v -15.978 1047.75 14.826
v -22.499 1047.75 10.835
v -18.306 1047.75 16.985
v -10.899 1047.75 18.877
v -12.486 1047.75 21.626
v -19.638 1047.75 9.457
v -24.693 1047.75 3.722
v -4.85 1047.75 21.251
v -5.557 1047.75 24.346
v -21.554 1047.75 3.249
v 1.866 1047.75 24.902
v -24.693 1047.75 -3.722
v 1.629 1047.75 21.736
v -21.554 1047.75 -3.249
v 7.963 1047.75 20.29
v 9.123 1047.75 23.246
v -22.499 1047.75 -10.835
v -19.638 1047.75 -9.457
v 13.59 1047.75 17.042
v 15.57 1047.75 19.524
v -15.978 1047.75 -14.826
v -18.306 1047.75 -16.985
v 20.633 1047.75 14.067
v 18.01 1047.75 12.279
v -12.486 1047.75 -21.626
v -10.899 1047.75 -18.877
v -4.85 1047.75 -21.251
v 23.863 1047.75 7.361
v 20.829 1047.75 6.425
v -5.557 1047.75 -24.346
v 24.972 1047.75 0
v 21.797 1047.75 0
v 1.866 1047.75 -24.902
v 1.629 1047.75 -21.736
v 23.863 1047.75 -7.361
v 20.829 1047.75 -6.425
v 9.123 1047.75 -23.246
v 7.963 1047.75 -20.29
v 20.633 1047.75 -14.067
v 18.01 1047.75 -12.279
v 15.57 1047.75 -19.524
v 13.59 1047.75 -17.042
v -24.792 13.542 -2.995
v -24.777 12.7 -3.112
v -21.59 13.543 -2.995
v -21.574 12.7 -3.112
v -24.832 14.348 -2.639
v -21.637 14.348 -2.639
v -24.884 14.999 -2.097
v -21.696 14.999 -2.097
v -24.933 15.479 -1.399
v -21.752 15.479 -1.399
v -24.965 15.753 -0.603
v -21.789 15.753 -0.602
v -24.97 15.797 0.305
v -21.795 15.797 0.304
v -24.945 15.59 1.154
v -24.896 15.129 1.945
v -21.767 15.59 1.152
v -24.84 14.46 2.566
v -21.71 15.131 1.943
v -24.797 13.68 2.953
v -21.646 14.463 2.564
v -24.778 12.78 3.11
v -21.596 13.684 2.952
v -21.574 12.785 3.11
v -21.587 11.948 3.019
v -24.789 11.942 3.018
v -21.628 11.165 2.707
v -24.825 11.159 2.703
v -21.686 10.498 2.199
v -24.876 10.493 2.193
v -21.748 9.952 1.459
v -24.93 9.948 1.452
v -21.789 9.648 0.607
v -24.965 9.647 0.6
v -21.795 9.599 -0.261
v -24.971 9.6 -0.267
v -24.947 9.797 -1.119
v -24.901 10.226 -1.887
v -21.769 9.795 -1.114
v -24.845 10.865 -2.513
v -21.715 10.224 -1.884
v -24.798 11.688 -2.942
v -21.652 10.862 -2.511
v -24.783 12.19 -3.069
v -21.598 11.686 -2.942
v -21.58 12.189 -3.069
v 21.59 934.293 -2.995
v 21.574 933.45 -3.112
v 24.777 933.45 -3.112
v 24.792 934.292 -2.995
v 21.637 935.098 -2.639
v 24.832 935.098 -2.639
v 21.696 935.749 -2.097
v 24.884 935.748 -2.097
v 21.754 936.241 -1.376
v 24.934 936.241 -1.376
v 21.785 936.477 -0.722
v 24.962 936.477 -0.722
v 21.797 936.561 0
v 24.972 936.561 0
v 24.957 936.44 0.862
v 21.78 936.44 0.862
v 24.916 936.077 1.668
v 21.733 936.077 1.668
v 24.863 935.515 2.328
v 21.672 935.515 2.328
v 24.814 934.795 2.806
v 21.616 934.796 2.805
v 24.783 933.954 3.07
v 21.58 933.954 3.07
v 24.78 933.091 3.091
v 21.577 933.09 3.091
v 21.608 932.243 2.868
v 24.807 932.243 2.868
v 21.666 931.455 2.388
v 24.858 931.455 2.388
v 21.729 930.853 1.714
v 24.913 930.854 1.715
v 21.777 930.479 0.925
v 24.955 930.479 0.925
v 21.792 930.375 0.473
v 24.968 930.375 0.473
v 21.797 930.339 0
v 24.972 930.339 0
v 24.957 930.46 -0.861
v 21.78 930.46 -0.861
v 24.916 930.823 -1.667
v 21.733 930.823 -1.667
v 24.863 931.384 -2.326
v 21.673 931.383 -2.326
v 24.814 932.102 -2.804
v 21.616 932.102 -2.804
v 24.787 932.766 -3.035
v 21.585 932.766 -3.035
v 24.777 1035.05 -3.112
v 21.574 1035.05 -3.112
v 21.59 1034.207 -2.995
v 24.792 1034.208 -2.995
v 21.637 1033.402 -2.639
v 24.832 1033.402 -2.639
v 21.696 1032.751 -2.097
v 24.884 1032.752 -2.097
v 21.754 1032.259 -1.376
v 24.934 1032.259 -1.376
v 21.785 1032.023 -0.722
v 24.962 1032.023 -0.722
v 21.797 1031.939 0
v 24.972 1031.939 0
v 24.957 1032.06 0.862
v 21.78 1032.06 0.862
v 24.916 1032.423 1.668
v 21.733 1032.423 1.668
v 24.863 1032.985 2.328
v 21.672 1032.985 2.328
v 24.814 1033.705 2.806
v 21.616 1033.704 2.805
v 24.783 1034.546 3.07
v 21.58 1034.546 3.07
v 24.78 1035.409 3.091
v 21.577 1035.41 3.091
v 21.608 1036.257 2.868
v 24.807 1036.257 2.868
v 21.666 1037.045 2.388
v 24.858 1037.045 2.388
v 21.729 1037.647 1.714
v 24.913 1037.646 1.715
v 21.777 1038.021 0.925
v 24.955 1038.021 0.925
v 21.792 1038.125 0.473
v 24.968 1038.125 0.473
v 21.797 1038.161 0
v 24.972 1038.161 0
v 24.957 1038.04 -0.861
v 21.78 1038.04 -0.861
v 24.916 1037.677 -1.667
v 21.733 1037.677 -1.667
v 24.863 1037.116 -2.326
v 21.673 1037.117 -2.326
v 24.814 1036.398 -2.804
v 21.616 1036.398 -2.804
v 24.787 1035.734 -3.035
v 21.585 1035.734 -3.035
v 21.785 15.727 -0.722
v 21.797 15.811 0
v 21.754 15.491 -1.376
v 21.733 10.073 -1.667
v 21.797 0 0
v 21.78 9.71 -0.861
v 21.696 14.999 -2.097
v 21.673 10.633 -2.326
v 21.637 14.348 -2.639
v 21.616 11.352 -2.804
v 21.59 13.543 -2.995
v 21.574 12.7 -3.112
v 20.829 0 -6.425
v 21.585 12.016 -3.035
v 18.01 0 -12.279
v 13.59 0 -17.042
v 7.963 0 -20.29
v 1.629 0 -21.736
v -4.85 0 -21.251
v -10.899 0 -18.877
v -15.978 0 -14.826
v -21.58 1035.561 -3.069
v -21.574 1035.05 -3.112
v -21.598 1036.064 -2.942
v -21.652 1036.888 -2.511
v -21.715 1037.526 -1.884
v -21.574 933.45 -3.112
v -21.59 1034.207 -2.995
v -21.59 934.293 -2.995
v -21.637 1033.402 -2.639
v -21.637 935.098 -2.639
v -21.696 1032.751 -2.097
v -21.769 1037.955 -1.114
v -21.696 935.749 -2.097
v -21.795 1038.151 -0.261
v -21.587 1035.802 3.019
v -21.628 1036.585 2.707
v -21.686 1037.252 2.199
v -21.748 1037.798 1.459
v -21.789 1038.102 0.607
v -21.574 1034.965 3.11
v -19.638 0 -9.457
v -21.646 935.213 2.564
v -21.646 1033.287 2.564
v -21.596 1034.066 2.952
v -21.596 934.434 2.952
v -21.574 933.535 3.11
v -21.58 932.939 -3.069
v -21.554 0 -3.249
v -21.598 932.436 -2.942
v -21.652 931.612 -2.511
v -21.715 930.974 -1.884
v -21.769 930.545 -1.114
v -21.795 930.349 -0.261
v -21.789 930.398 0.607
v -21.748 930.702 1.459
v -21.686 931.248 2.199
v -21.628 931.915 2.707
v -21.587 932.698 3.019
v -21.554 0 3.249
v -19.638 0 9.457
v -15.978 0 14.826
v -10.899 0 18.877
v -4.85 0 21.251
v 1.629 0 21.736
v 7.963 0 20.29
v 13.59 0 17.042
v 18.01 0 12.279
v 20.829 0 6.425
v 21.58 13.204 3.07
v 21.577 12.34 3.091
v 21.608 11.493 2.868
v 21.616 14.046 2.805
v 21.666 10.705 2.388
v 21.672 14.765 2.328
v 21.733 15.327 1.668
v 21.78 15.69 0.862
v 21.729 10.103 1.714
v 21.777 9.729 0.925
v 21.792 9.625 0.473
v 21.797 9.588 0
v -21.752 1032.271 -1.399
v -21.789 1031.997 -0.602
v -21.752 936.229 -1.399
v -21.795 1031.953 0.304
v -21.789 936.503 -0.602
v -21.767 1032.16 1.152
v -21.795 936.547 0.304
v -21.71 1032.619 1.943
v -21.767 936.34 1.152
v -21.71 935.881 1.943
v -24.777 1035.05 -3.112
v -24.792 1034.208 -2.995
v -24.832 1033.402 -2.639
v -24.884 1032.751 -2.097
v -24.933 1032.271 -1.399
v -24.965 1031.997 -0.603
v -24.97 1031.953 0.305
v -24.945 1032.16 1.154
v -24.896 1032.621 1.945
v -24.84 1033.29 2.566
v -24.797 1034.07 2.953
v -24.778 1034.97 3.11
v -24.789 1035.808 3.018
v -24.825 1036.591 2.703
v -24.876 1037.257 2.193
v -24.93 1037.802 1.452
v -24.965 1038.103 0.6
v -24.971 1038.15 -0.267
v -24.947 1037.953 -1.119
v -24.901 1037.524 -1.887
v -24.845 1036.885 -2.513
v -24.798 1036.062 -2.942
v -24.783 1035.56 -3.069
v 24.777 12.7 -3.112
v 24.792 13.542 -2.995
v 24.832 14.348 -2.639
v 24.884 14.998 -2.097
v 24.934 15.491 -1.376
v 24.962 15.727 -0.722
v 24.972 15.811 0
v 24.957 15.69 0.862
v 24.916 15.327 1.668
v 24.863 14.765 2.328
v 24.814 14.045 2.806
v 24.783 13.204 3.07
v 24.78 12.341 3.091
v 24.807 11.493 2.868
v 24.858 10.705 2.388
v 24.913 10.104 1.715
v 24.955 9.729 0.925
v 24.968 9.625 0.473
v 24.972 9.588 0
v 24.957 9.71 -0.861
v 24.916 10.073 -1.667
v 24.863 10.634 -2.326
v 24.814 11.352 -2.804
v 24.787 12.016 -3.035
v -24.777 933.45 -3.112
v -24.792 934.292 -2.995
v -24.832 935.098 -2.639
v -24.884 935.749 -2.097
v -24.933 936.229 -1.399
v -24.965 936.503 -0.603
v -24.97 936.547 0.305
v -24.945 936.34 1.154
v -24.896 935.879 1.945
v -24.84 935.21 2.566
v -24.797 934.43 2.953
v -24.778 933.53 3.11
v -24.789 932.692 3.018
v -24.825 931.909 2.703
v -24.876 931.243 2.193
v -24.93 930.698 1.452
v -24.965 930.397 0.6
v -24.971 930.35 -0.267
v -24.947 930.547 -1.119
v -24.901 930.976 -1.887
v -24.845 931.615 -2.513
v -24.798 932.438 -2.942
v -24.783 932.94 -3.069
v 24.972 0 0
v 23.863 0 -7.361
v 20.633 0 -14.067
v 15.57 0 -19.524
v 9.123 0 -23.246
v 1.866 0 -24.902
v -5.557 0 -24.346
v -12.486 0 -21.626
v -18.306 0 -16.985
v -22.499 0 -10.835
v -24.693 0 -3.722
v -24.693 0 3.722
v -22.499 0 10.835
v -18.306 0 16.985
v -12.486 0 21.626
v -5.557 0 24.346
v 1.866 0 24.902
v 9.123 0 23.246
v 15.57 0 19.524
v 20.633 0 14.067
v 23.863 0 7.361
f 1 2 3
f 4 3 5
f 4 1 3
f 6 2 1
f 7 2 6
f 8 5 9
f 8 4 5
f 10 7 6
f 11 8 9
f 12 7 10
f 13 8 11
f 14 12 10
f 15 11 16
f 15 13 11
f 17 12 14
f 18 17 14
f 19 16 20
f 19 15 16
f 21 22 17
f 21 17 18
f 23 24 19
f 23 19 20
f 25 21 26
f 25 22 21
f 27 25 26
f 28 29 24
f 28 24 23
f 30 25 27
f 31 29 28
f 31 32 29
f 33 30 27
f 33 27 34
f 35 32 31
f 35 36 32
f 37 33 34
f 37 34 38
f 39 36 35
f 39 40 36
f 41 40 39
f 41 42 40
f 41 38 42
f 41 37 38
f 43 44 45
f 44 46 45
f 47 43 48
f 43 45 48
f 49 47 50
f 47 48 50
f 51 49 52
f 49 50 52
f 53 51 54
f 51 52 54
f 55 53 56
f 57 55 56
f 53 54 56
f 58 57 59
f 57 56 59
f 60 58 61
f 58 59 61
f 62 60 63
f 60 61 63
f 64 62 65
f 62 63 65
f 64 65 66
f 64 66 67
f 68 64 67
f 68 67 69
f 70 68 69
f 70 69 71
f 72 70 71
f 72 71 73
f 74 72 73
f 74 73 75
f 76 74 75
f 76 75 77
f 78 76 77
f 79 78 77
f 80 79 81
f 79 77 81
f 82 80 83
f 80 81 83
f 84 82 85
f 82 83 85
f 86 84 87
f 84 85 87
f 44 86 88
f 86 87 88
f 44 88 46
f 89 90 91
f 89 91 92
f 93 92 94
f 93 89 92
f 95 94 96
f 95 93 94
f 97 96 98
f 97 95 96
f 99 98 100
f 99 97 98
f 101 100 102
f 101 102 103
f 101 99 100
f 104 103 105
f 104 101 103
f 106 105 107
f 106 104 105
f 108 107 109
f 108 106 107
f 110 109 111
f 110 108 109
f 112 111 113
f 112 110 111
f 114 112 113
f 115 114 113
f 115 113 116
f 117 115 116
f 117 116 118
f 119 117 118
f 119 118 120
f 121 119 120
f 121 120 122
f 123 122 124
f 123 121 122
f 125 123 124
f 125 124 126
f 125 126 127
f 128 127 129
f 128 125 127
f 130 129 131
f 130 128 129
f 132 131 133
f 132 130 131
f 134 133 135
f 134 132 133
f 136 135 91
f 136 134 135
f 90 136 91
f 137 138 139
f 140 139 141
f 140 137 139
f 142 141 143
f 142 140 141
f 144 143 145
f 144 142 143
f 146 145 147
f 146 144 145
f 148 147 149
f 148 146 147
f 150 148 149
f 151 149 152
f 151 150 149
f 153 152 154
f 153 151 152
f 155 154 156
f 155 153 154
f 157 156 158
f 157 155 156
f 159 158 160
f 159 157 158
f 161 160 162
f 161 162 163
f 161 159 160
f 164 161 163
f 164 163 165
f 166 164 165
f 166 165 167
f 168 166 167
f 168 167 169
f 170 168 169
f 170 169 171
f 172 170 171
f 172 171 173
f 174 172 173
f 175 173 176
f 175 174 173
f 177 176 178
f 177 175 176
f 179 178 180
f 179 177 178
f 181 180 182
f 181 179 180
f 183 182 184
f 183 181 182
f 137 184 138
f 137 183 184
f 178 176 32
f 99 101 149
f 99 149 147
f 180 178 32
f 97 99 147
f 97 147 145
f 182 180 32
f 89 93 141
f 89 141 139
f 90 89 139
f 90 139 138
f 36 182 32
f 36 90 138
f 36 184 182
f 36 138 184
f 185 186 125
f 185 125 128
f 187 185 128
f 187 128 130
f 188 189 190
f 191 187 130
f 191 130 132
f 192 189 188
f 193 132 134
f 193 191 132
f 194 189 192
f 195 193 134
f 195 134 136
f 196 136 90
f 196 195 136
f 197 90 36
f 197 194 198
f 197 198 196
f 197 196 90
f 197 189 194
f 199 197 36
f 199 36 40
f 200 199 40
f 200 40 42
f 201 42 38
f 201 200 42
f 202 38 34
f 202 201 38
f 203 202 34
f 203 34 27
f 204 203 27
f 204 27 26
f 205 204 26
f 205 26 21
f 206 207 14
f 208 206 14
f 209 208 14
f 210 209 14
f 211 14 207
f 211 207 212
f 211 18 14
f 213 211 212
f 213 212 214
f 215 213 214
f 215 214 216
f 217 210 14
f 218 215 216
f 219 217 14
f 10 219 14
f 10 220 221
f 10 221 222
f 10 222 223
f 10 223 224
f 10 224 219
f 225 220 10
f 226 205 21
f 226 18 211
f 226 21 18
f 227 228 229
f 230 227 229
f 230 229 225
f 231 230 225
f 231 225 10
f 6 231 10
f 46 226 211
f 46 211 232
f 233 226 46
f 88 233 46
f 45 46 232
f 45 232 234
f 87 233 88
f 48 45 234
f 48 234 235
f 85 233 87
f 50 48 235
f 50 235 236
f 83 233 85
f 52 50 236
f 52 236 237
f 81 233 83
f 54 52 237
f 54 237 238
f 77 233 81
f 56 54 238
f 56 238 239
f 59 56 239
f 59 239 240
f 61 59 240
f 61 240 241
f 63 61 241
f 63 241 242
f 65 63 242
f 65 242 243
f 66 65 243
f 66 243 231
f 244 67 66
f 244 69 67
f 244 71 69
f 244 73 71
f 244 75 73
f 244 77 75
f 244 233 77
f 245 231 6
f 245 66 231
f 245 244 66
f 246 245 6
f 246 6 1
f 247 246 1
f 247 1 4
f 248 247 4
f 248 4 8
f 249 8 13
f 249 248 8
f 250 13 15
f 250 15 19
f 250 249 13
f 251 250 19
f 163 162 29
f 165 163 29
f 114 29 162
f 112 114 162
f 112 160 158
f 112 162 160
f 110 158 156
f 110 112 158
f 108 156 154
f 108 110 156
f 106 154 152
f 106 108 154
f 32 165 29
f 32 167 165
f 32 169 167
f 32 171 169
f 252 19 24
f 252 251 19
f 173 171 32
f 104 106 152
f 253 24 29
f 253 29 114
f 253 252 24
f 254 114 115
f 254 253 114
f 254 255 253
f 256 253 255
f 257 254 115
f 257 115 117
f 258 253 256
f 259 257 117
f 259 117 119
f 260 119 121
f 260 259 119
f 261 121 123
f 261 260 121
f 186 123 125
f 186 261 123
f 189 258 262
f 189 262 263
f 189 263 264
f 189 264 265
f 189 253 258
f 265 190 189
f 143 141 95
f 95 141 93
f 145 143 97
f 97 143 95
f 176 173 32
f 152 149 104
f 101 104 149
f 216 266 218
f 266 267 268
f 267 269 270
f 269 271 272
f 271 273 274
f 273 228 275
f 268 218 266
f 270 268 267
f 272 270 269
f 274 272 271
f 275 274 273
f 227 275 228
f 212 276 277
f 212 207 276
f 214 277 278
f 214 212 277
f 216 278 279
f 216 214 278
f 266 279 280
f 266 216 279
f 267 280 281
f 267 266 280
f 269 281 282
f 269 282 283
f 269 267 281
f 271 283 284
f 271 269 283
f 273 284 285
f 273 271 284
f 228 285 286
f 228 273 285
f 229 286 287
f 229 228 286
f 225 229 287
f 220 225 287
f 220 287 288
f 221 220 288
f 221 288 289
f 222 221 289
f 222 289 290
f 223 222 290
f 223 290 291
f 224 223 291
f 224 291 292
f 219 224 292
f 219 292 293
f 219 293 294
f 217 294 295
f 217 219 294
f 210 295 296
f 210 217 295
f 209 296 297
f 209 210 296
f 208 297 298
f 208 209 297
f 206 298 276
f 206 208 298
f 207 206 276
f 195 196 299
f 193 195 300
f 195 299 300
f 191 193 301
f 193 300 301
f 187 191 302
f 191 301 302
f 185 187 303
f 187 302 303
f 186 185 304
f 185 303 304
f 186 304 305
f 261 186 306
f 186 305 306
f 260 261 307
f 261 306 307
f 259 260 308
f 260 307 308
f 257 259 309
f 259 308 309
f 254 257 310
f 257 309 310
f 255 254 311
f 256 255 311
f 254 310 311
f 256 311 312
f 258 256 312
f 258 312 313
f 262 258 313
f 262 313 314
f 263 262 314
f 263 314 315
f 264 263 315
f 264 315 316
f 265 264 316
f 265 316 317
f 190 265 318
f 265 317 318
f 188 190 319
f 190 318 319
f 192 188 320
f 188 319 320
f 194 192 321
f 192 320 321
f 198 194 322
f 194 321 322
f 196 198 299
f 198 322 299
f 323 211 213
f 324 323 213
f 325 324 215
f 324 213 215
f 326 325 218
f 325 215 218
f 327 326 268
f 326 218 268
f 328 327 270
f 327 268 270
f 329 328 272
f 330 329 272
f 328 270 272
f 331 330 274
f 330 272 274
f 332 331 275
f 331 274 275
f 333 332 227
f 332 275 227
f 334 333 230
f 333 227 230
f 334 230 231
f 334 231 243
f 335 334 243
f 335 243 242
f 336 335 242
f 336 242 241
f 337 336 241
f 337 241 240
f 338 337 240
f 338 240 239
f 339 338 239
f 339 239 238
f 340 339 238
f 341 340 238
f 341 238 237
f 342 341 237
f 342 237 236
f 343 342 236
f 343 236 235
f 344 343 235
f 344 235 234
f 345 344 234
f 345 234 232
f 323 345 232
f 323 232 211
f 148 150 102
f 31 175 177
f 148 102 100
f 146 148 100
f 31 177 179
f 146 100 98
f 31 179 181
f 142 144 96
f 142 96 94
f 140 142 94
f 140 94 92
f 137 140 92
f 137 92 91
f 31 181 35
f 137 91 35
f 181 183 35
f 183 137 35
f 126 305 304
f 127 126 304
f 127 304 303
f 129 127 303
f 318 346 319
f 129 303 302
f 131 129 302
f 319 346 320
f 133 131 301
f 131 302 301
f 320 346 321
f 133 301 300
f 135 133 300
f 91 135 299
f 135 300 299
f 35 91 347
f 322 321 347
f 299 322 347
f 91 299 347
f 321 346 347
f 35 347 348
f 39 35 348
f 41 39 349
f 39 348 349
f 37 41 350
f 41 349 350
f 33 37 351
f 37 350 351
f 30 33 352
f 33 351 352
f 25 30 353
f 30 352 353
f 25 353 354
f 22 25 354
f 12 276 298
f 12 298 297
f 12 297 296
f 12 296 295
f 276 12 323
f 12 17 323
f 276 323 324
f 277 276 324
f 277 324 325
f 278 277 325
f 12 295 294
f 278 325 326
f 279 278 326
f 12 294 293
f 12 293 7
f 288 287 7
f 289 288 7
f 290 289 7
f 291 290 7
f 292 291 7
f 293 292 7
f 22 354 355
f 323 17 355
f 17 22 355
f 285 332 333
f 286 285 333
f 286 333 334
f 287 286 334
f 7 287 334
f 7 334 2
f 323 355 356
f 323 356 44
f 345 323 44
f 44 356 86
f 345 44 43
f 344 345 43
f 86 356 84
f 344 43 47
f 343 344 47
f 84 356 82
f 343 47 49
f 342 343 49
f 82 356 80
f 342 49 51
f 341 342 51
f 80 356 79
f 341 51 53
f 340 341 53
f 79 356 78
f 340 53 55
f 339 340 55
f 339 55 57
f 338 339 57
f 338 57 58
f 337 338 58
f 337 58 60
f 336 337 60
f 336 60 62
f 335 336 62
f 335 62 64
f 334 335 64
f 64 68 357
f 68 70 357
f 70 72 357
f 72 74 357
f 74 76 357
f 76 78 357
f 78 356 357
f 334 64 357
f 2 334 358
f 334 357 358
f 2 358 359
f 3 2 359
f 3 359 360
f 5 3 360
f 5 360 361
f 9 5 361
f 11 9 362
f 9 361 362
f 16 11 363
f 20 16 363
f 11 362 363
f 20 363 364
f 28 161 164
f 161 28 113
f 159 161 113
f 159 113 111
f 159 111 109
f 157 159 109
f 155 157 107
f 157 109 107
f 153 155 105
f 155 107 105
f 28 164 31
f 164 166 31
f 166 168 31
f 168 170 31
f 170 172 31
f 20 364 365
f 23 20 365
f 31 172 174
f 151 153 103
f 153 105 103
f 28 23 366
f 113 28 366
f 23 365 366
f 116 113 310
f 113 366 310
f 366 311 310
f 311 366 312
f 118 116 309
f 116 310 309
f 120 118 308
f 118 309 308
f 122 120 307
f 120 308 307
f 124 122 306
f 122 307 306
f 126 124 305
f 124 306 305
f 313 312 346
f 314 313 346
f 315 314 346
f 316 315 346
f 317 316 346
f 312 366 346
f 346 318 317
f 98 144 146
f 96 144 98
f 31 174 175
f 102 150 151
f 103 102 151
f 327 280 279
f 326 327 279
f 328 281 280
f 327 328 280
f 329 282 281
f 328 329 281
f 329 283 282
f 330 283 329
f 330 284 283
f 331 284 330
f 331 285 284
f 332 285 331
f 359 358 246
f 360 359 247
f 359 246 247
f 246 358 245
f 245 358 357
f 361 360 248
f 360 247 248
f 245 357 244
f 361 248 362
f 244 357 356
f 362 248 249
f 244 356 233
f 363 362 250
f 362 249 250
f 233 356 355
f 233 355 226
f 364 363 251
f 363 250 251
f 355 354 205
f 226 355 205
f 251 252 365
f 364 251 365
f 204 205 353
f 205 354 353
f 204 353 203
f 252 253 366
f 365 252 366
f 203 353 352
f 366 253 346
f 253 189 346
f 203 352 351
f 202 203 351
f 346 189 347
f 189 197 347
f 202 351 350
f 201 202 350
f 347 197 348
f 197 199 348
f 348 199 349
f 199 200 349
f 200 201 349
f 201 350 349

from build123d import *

# Parameters (mm, degrees)
SKETCH1_R               = 24.97201
SKETCH1_R_2             = 21.79701
BOSS_EXTRUDE1_DEPTH     = 1047.75
SKETCH2_R               = 3.1115
CUT_EXTRUDE1_DEPTH      = 25.97201
SKETCH3_R               = 3.1115
CUT_EXTRUDE3_DEPTH      = 25.9720101
CUT_EXTRUDE3_DEPTH_BACK = 25.9720101


with BuildPart() as part:
    # Sketch1 → Boss-Extrude1 (new body)
    with BuildSketch(Plane(origin=(0, 0, 0), x_dir=(1, 0, 0), z_dir=(0, 1, 0))):
        Circle(SKETCH1_R)
        Circle(SKETCH1_R_2, mode=Mode.SUBTRACT)
    extrude(amount=BOSS_EXTRUDE1_DEPTH)

    # Sketch2 → Cut-Extrude1 (cut, symmetric)
    with BuildSketch(Plane(origin=(0, 0, 0), x_dir=(0, 0, -1), z_dir=(1, 0, 0))):
        with Locations((0, 12.7)):
            Circle(SKETCH2_R)
    cut_extrude1 = extrude(amount=CUT_EXTRUDE1_DEPTH, both=True, mode=Mode.SUBTRACT)

    # Mirror1: Cut-Extrude1 across plane
    add(cut_extrude1.mirror(Plane.ZX.offset(523.875)), mode=Mode.SUBTRACT)

    # Sketch3 → Cut-Extrude3 (cut, two sides)
    with BuildSketch(Plane(origin=(0, 0, 0), x_dir=(0, 0, -1), z_dir=(1, 0, 0))) as cut_extrude3_sk:
        with Locations((0, 933.45)):
            Circle(SKETCH3_R)
    extrude(amount=CUT_EXTRUDE3_DEPTH, mode=Mode.SUBTRACT)
    extrude(cut_extrude3_sk.sketch, amount=-CUT_EXTRUDE3_DEPTH_BACK, mode=Mode.SUBTRACT)


solid = part.part
